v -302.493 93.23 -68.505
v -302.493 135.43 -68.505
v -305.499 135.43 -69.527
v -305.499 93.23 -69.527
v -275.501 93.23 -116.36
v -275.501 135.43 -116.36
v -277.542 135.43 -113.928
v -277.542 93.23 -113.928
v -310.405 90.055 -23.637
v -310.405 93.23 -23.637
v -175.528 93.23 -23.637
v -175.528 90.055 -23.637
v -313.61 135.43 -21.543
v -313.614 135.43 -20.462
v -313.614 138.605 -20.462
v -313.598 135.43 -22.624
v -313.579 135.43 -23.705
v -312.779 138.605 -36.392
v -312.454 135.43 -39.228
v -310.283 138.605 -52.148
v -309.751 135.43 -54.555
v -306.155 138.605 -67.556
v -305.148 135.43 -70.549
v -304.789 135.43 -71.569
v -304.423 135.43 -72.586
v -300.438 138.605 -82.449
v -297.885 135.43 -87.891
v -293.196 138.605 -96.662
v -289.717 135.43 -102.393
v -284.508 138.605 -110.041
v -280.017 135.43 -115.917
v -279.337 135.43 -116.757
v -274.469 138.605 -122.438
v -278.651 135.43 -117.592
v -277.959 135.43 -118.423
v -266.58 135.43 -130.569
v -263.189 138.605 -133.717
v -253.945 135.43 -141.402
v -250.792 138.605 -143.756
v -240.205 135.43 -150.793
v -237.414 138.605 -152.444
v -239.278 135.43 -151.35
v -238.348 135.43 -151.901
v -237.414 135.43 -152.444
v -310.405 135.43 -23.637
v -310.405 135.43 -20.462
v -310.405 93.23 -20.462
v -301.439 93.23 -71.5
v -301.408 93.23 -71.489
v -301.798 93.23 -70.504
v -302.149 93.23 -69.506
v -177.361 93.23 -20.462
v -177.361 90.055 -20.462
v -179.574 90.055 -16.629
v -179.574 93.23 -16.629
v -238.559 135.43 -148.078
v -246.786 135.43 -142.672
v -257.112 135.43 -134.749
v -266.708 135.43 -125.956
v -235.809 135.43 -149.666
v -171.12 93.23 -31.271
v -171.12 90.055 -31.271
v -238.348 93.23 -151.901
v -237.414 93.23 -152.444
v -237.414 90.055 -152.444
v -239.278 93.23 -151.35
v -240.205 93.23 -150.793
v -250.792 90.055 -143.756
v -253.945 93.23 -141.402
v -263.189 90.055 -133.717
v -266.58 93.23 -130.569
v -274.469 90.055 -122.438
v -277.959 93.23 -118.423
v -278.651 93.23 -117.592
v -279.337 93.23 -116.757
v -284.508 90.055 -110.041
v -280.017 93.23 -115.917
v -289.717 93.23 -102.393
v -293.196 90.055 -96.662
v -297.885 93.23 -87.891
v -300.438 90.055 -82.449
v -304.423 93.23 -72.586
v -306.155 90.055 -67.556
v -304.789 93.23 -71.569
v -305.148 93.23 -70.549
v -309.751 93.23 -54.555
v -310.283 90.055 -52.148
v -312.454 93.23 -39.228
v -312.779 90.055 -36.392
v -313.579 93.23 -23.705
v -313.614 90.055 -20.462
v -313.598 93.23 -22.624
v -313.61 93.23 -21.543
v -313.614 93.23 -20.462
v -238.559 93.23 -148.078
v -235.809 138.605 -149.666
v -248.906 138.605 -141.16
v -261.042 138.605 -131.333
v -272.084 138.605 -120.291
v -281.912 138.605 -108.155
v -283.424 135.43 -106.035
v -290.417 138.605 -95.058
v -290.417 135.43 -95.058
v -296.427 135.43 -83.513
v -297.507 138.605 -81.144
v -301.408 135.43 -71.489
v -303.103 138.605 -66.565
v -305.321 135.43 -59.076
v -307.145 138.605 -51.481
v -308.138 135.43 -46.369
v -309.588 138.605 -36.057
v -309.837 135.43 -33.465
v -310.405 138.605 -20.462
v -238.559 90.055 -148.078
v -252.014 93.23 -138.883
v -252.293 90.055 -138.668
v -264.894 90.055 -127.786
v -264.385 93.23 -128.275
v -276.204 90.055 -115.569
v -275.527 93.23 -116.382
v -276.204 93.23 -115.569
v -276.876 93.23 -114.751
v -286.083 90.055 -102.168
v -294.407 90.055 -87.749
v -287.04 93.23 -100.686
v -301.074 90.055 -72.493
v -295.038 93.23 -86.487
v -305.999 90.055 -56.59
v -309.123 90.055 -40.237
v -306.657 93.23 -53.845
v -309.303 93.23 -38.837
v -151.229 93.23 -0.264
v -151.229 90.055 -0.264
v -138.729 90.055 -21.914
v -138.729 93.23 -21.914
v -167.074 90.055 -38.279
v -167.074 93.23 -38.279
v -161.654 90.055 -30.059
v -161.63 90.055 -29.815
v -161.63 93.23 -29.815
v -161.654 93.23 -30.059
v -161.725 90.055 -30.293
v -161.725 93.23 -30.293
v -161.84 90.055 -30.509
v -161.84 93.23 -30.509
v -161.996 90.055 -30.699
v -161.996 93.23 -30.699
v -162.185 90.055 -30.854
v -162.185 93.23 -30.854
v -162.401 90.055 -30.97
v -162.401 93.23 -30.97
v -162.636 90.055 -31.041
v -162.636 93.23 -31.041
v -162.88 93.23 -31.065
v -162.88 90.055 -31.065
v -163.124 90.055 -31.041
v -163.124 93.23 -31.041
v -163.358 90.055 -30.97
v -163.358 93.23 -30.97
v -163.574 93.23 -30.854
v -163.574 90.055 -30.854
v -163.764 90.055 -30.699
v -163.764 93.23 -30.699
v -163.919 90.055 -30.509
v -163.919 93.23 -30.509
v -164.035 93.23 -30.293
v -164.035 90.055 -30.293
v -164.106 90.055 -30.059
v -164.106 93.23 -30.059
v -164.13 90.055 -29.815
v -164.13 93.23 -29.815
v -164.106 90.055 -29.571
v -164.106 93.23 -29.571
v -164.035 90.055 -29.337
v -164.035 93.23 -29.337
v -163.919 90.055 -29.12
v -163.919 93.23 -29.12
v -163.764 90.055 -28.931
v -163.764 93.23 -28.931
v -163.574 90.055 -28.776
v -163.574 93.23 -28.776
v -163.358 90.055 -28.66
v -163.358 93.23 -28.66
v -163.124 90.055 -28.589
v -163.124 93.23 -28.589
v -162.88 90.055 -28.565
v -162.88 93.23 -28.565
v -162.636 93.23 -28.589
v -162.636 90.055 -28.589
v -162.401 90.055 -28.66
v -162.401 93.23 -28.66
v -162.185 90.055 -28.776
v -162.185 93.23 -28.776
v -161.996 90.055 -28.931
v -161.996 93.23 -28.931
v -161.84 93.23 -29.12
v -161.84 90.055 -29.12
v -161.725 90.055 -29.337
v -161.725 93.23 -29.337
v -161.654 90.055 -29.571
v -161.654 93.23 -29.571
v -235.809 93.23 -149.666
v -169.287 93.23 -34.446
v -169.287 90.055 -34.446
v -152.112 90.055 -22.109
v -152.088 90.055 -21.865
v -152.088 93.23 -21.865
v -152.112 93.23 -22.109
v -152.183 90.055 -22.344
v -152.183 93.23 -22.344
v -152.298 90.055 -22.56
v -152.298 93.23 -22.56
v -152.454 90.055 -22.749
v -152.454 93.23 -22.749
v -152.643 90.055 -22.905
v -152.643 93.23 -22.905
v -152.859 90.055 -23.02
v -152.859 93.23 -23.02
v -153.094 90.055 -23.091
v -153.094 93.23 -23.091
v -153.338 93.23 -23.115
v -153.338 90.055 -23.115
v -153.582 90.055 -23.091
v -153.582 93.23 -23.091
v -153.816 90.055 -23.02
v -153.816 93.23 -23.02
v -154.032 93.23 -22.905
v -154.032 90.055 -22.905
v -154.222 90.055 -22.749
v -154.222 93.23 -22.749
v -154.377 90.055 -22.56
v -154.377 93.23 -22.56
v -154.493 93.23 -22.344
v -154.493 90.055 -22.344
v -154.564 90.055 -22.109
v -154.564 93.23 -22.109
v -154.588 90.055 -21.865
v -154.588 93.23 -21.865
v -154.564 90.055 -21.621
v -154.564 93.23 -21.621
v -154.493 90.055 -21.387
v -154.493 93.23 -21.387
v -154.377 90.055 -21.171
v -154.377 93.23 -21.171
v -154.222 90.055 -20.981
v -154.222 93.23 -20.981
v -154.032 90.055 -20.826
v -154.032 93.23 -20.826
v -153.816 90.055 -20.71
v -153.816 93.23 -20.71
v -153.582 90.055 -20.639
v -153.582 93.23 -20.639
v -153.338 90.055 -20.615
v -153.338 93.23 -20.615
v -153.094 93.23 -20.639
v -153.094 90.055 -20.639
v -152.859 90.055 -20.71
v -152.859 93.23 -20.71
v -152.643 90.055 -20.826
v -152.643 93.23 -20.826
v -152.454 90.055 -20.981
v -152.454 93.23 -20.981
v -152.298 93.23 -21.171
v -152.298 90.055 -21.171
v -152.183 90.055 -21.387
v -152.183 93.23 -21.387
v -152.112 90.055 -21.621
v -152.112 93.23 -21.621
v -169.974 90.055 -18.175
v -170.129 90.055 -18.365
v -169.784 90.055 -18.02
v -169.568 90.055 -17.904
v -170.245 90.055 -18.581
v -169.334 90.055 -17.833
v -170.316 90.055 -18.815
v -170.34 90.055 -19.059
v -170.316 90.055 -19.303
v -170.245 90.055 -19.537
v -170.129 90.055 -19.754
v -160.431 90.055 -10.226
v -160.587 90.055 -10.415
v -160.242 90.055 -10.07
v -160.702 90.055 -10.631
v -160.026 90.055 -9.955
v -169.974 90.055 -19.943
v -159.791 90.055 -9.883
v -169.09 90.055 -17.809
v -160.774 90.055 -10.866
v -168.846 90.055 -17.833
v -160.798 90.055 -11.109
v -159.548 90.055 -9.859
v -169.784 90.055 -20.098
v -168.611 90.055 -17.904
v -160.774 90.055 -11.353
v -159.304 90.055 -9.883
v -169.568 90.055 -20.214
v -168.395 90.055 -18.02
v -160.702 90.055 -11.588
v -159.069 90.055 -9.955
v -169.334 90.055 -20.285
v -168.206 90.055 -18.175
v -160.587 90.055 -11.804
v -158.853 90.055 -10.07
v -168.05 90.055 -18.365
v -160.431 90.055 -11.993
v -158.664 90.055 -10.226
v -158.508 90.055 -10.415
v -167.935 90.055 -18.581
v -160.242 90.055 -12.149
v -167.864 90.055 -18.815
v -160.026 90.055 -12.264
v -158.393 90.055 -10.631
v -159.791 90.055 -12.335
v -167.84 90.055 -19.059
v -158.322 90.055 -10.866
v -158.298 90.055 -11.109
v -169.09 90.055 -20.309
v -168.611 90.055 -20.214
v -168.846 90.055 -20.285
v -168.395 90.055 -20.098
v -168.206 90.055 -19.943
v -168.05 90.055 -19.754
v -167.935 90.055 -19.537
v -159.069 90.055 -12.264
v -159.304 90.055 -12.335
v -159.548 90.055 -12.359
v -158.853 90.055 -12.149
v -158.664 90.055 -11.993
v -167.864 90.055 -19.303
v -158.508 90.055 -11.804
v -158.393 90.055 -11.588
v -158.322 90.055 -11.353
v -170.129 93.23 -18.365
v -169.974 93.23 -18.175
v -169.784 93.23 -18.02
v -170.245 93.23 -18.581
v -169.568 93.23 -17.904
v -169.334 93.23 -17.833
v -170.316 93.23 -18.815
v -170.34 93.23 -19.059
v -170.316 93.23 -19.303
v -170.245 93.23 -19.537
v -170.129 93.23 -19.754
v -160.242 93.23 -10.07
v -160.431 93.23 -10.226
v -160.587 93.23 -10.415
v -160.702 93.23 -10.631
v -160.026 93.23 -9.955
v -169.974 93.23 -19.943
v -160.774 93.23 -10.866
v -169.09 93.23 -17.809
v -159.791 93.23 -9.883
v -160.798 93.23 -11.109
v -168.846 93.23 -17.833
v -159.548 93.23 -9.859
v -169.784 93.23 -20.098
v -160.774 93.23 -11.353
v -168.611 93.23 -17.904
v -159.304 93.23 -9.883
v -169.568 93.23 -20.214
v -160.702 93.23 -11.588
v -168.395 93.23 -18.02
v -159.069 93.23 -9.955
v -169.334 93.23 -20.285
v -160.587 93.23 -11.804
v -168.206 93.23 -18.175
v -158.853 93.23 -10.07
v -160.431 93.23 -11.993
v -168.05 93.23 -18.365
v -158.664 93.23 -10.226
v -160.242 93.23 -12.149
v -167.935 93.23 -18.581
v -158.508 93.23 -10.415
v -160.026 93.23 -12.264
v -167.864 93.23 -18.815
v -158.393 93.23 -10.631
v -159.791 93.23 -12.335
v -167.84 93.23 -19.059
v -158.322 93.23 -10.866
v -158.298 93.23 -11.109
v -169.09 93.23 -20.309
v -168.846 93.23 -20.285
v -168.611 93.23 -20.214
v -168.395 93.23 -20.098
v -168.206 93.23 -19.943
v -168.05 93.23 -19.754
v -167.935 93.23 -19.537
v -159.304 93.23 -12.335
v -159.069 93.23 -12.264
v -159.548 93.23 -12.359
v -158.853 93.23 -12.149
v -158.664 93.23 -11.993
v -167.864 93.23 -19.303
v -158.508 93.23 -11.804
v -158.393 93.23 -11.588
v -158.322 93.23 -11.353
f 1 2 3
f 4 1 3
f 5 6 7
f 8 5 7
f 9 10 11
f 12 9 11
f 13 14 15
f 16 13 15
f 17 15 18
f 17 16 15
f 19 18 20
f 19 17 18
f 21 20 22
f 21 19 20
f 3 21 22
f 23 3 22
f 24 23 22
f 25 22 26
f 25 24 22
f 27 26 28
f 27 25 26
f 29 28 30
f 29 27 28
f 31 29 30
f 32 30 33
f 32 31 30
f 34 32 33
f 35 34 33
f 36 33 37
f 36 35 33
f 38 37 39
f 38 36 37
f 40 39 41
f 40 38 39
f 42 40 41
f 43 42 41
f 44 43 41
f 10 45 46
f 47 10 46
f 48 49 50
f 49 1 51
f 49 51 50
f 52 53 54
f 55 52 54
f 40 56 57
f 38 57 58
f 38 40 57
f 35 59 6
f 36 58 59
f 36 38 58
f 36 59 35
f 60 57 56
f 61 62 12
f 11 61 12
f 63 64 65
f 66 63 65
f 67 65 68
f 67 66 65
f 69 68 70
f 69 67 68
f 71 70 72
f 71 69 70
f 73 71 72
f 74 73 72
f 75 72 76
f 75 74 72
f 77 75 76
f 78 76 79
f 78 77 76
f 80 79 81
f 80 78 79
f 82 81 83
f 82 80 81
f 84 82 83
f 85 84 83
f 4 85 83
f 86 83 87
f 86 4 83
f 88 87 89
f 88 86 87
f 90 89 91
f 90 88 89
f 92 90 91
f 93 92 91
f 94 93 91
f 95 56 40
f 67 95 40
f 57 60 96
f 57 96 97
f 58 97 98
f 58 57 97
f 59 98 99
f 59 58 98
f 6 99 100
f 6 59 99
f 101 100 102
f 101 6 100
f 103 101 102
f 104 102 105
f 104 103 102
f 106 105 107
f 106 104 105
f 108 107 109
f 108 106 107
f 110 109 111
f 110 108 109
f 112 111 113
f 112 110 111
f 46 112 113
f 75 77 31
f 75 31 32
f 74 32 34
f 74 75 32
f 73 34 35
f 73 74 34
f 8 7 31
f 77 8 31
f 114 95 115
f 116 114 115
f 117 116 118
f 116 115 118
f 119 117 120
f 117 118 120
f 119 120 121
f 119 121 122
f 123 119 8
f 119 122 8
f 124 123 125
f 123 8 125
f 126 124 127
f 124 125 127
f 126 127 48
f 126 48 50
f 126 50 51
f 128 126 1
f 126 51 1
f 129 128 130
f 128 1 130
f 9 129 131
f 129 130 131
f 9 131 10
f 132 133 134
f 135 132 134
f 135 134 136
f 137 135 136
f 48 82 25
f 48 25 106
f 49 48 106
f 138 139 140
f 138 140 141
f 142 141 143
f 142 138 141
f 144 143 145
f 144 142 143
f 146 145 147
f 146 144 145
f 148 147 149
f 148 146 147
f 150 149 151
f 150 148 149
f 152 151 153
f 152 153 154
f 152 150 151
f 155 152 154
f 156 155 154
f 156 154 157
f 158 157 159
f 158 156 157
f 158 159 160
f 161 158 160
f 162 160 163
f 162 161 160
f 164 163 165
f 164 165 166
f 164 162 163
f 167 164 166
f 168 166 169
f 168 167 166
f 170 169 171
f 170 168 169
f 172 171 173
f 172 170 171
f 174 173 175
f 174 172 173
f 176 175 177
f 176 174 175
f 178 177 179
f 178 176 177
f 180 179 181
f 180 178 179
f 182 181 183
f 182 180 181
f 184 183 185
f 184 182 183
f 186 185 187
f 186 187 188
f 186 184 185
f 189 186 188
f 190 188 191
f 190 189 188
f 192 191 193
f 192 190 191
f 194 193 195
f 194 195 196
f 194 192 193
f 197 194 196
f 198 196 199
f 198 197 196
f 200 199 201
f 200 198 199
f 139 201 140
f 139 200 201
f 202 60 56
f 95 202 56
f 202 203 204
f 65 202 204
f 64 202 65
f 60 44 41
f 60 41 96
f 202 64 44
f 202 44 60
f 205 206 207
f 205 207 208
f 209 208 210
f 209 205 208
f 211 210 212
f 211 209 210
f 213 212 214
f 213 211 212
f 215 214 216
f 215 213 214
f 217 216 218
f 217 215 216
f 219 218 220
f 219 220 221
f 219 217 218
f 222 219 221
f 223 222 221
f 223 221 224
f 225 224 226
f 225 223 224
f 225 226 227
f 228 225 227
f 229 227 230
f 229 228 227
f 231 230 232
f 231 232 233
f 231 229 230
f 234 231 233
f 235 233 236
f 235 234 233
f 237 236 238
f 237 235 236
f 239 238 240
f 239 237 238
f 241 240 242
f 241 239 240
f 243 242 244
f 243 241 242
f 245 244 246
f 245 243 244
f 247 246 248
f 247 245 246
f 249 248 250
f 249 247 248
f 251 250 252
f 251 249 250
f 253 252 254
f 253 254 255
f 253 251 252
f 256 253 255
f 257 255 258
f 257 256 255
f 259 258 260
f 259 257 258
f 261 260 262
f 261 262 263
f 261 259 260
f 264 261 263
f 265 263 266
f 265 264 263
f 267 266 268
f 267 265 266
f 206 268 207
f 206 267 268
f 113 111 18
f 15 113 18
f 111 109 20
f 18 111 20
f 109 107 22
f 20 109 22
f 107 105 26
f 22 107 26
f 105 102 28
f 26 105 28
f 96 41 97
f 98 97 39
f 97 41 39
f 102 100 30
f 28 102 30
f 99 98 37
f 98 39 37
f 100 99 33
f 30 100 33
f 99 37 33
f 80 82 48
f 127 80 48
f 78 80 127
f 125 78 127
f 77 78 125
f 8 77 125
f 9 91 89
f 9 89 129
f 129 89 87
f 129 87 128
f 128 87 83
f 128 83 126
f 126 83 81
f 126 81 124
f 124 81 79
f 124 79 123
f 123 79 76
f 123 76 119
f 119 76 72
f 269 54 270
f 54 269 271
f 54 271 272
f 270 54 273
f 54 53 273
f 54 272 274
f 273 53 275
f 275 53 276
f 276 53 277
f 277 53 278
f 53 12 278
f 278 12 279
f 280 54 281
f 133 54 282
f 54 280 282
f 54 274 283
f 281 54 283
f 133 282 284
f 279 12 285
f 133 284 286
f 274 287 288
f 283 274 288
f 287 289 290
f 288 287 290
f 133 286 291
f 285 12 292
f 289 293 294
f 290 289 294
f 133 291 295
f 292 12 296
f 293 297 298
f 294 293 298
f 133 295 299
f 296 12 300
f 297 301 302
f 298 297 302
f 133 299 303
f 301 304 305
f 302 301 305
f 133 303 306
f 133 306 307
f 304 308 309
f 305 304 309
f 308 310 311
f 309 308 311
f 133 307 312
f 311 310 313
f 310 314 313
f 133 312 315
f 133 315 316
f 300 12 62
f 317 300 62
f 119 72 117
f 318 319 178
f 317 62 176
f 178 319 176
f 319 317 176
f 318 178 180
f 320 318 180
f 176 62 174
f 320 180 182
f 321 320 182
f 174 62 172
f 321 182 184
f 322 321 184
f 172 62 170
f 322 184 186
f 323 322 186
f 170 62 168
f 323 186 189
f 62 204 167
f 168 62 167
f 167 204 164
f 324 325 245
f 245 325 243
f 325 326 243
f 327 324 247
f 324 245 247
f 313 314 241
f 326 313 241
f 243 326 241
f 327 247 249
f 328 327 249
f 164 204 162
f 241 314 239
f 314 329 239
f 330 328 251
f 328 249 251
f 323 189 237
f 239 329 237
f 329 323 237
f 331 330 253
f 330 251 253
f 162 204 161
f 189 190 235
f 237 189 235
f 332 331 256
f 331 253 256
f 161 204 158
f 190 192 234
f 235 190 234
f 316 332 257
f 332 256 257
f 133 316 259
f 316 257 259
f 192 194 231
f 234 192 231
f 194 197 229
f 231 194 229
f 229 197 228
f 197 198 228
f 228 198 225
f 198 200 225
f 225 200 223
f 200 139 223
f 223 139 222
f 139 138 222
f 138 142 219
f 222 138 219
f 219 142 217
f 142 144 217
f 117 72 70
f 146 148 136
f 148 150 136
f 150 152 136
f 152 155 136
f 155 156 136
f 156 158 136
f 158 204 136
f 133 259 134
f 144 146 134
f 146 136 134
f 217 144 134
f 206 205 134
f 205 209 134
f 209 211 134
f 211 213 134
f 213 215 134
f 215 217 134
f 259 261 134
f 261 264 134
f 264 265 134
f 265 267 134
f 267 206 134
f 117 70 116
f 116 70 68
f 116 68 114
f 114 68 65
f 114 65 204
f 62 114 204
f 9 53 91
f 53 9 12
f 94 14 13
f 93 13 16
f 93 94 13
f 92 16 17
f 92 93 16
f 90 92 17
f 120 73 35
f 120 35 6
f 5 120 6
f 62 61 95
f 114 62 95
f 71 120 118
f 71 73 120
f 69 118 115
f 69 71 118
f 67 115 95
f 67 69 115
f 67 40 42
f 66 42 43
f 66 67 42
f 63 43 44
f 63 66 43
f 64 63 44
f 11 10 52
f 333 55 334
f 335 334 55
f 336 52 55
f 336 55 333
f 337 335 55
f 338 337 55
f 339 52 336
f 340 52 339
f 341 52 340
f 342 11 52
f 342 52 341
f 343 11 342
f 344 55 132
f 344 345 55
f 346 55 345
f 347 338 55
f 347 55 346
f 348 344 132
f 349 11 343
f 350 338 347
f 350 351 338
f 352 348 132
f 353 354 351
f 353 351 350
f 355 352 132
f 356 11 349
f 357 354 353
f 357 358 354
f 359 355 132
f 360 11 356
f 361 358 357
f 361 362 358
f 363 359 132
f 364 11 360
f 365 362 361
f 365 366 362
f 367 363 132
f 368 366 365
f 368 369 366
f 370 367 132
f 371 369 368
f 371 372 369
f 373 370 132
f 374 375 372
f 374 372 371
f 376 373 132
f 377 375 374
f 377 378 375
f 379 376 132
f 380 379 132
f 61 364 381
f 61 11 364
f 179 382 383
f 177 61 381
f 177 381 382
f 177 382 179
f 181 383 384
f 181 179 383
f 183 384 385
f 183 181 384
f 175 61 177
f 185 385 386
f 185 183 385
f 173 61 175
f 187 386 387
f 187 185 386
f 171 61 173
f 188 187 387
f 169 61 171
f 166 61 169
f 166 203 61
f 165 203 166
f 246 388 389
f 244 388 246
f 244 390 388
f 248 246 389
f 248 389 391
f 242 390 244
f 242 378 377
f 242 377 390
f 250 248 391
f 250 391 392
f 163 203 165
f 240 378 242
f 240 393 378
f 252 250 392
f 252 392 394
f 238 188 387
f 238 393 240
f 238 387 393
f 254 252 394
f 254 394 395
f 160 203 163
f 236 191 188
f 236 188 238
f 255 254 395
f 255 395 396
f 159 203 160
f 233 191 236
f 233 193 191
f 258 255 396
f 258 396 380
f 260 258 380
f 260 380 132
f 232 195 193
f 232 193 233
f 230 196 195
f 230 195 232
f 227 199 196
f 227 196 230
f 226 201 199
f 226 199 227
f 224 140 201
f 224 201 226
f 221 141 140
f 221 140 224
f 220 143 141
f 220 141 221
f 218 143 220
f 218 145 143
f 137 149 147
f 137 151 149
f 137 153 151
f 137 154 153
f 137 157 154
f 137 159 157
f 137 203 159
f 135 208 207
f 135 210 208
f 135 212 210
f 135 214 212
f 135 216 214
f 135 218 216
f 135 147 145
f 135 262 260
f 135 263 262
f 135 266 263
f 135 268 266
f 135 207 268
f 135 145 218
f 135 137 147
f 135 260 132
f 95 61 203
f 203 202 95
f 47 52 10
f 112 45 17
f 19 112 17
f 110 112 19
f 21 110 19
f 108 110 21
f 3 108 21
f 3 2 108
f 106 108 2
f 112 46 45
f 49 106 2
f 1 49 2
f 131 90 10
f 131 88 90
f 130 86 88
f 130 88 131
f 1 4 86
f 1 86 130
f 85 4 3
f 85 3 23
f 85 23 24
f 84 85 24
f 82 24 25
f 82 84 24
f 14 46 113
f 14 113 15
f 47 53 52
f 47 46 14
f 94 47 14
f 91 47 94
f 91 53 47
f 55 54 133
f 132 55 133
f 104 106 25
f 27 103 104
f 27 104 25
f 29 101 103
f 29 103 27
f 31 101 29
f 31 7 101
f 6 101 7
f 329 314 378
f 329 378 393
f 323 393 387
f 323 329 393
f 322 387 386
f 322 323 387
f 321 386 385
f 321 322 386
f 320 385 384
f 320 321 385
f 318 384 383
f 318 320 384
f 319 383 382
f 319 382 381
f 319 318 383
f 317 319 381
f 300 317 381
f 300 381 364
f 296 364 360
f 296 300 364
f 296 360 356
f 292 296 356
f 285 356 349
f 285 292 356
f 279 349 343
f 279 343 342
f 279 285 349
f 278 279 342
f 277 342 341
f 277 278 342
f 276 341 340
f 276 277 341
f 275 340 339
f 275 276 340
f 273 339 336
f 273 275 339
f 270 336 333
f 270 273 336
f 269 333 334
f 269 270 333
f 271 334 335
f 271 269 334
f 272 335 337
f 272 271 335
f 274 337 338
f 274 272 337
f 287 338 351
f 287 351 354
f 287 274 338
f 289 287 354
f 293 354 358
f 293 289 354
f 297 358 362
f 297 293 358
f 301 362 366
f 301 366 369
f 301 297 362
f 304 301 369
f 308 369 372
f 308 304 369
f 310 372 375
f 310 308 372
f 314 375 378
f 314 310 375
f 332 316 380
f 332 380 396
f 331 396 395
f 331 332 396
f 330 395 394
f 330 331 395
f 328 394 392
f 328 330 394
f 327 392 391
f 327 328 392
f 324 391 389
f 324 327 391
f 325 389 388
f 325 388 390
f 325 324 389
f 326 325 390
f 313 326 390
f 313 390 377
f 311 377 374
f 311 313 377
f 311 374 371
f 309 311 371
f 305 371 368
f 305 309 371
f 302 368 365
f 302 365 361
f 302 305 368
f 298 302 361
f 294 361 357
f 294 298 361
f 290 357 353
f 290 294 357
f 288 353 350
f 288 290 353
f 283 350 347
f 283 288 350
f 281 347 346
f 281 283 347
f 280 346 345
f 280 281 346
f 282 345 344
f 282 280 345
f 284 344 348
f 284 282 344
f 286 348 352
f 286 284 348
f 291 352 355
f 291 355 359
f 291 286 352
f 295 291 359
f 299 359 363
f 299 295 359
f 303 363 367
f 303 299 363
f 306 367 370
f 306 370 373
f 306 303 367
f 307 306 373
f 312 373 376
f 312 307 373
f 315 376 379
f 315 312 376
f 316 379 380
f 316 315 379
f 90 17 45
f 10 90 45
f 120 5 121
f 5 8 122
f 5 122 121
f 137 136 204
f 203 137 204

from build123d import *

# Parameters (mm, degrees)
SKETCH1_R           = 1.25
BOSS_EXTRUDE1_DEPTH = 3.175
BOSS_EXTRUDE2_DEPTH = 3.175
BOSS_EXTRUDE3_DEPTH = 42.2
BOSS_EXTRUDE4_DEPTH = 3.175


with BuildPart() as part:
    # Sketch1 → Boss-Extrude1 (new body)
    with BuildSketch(Plane(origin=(0, 90.055223859, 0), x_dir=(1, 0, 0), z_dir=(0, 1, 0))):
        Polygon((-138.728927309, 21.91435009), (-167.073938775, 38.27935009), (-179.573938775, 16.628714996), (-151.228927309, 0.263714996), align=None)
        with Locations((-169.089659252, 19.059098981)):
            Circle(SKETCH1_R, mode=Mode.SUBTRACT)
        with Locations((-162.879788078, 29.814911363)):
            Circle(SKETCH1_R, mode=Mode.SUBTRACT)
        with Locations((-153.337652818, 21.865216105)):
            Circle(SKETCH1_R, mode=Mode.SUBTRACT)
        with Locations((-159.547523992, 11.109403723)):
            Circle(SKETCH1_R, mode=Mode.SUBTRACT)
    extrude(amount=BOSS_EXTRUDE1_DEPTH)

    # Sketch2 → Boss-Extrude2 (add)
    with BuildSketch(Plane(origin=(0, 93.230223859, 0), x_dir=(1, 0, 0), z_dir=(0, 1, 0))):
        with BuildLine():
            Line((-161.213656035, 20.462157543), (-237.413656035, 152.44442908))
            ThreePointArc((-237.413656035, 152.44442908), (-293.195927572, 96.662157543), (-313.613656035, 20.462157543))
            Line((-313.613656035, 20.462157543), (-161.213656035, 20.462157543))
        make_face()
        with BuildLine():
            Line((-166.712917349, 23.637157543), (-238.558896482, 148.078043722))
            ThreePointArc((-238.558896482, 148.078043722), (-290.446296915, 95.074657543), (-310.404875616, 23.637157543))
            Line((-310.404875616, 23.637157543), (-166.712917349, 23.637157543))
        make_face(mode=Mode.SUBTRACT)
    extrude(amount=-BOSS_EXTRUDE2_DEPTH)

    # Sketch3 → Boss-Extrude3 (add)
    with BuildSketch(Plane(origin=(0, 93.230223859, 0), x_dir=(1, 0, 0), z_dir=(0, 1, 0))):
        with BuildLine():
            Line((-238.558896482, 148.078043722), (-240.204539896, 150.793275343))
            ThreePointArc((-240.204539896, 150.793275343), (-238.813489705, 151.626275405), (-237.413656035, 152.44442908))
            Line((-237.413656035, 152.44442908), (-235.809265825, 149.665543722))
            Line((-235.809265825, 149.665543722), (-238.558896482, 148.078043722))
        make_face()
        with BuildLine():
            Line((-310.404875616, 20.462157543), (-313.613656035, 20.462157543))
            ThreePointArc((-313.613656035, 20.462157543), (-313.605031003, 22.0835259), (-313.579156883, 23.704710735))
            Line((-313.579156883, 23.704710735), (-310.404875616, 23.637157543))
            Line((-310.404875616, 23.637157543), (-310.404875616, 20.462157543))
        make_face()
        with BuildLine():
            Line((-277.541611418, 113.928233857), (-280.016674298, 115.916873778))
            ThreePointArc((-280.016674298, 115.916873778), (-278.994417499, 117.175404976), (-277.958829166, 118.422989259))
            Line((-277.958829166, 118.422989259), (-275.500760757, 116.360424964))
            Line((-275.500760757, 116.360424964), (-277.541611418, 113.928233857))
        make_face()
        with BuildLine():
            Line((-302.493458116, 68.505035776), (-305.499411352, 69.527224675))
            ThreePointArc((-305.499411352, 69.527224675), (-304.969247202, 71.059489571), (-304.422811443, 72.586027386))
            Line((-304.422811443, 72.586027386), (-301.407544161, 71.488559847))
            Line((-301.407544161, 71.488559847), (-302.493458116, 68.505035776))
        make_face()
    extrude(amount=BOSS_EXTRUDE3_DEPTH)

    # Sketch4 → Boss-Extrude4 (add)
    with BuildSketch(Plane(origin=(0, 135.430223859, 0), x_dir=(1, 0, 0), z_dir=(0, 1, 0))):
        with BuildLine():
            Line((-237.413656035, 152.44442908), (-235.809265825, 149.665543722))
            ThreePointArc((-235.809265825, 149.665543722), (-290.417042213, 95.057767334), (-310.404875616, 20.462157543))
            Line((-310.404875616, 20.462157543), (-313.613656035, 20.462157543))
            ThreePointArc((-313.613656035, 20.462157543), (-293.195927572, 96.662157543), (-237.413656035, 152.44442908))
        make_face()
    extrude(amount=BOSS_EXTRUDE4_DEPTH)


solid = part.part
